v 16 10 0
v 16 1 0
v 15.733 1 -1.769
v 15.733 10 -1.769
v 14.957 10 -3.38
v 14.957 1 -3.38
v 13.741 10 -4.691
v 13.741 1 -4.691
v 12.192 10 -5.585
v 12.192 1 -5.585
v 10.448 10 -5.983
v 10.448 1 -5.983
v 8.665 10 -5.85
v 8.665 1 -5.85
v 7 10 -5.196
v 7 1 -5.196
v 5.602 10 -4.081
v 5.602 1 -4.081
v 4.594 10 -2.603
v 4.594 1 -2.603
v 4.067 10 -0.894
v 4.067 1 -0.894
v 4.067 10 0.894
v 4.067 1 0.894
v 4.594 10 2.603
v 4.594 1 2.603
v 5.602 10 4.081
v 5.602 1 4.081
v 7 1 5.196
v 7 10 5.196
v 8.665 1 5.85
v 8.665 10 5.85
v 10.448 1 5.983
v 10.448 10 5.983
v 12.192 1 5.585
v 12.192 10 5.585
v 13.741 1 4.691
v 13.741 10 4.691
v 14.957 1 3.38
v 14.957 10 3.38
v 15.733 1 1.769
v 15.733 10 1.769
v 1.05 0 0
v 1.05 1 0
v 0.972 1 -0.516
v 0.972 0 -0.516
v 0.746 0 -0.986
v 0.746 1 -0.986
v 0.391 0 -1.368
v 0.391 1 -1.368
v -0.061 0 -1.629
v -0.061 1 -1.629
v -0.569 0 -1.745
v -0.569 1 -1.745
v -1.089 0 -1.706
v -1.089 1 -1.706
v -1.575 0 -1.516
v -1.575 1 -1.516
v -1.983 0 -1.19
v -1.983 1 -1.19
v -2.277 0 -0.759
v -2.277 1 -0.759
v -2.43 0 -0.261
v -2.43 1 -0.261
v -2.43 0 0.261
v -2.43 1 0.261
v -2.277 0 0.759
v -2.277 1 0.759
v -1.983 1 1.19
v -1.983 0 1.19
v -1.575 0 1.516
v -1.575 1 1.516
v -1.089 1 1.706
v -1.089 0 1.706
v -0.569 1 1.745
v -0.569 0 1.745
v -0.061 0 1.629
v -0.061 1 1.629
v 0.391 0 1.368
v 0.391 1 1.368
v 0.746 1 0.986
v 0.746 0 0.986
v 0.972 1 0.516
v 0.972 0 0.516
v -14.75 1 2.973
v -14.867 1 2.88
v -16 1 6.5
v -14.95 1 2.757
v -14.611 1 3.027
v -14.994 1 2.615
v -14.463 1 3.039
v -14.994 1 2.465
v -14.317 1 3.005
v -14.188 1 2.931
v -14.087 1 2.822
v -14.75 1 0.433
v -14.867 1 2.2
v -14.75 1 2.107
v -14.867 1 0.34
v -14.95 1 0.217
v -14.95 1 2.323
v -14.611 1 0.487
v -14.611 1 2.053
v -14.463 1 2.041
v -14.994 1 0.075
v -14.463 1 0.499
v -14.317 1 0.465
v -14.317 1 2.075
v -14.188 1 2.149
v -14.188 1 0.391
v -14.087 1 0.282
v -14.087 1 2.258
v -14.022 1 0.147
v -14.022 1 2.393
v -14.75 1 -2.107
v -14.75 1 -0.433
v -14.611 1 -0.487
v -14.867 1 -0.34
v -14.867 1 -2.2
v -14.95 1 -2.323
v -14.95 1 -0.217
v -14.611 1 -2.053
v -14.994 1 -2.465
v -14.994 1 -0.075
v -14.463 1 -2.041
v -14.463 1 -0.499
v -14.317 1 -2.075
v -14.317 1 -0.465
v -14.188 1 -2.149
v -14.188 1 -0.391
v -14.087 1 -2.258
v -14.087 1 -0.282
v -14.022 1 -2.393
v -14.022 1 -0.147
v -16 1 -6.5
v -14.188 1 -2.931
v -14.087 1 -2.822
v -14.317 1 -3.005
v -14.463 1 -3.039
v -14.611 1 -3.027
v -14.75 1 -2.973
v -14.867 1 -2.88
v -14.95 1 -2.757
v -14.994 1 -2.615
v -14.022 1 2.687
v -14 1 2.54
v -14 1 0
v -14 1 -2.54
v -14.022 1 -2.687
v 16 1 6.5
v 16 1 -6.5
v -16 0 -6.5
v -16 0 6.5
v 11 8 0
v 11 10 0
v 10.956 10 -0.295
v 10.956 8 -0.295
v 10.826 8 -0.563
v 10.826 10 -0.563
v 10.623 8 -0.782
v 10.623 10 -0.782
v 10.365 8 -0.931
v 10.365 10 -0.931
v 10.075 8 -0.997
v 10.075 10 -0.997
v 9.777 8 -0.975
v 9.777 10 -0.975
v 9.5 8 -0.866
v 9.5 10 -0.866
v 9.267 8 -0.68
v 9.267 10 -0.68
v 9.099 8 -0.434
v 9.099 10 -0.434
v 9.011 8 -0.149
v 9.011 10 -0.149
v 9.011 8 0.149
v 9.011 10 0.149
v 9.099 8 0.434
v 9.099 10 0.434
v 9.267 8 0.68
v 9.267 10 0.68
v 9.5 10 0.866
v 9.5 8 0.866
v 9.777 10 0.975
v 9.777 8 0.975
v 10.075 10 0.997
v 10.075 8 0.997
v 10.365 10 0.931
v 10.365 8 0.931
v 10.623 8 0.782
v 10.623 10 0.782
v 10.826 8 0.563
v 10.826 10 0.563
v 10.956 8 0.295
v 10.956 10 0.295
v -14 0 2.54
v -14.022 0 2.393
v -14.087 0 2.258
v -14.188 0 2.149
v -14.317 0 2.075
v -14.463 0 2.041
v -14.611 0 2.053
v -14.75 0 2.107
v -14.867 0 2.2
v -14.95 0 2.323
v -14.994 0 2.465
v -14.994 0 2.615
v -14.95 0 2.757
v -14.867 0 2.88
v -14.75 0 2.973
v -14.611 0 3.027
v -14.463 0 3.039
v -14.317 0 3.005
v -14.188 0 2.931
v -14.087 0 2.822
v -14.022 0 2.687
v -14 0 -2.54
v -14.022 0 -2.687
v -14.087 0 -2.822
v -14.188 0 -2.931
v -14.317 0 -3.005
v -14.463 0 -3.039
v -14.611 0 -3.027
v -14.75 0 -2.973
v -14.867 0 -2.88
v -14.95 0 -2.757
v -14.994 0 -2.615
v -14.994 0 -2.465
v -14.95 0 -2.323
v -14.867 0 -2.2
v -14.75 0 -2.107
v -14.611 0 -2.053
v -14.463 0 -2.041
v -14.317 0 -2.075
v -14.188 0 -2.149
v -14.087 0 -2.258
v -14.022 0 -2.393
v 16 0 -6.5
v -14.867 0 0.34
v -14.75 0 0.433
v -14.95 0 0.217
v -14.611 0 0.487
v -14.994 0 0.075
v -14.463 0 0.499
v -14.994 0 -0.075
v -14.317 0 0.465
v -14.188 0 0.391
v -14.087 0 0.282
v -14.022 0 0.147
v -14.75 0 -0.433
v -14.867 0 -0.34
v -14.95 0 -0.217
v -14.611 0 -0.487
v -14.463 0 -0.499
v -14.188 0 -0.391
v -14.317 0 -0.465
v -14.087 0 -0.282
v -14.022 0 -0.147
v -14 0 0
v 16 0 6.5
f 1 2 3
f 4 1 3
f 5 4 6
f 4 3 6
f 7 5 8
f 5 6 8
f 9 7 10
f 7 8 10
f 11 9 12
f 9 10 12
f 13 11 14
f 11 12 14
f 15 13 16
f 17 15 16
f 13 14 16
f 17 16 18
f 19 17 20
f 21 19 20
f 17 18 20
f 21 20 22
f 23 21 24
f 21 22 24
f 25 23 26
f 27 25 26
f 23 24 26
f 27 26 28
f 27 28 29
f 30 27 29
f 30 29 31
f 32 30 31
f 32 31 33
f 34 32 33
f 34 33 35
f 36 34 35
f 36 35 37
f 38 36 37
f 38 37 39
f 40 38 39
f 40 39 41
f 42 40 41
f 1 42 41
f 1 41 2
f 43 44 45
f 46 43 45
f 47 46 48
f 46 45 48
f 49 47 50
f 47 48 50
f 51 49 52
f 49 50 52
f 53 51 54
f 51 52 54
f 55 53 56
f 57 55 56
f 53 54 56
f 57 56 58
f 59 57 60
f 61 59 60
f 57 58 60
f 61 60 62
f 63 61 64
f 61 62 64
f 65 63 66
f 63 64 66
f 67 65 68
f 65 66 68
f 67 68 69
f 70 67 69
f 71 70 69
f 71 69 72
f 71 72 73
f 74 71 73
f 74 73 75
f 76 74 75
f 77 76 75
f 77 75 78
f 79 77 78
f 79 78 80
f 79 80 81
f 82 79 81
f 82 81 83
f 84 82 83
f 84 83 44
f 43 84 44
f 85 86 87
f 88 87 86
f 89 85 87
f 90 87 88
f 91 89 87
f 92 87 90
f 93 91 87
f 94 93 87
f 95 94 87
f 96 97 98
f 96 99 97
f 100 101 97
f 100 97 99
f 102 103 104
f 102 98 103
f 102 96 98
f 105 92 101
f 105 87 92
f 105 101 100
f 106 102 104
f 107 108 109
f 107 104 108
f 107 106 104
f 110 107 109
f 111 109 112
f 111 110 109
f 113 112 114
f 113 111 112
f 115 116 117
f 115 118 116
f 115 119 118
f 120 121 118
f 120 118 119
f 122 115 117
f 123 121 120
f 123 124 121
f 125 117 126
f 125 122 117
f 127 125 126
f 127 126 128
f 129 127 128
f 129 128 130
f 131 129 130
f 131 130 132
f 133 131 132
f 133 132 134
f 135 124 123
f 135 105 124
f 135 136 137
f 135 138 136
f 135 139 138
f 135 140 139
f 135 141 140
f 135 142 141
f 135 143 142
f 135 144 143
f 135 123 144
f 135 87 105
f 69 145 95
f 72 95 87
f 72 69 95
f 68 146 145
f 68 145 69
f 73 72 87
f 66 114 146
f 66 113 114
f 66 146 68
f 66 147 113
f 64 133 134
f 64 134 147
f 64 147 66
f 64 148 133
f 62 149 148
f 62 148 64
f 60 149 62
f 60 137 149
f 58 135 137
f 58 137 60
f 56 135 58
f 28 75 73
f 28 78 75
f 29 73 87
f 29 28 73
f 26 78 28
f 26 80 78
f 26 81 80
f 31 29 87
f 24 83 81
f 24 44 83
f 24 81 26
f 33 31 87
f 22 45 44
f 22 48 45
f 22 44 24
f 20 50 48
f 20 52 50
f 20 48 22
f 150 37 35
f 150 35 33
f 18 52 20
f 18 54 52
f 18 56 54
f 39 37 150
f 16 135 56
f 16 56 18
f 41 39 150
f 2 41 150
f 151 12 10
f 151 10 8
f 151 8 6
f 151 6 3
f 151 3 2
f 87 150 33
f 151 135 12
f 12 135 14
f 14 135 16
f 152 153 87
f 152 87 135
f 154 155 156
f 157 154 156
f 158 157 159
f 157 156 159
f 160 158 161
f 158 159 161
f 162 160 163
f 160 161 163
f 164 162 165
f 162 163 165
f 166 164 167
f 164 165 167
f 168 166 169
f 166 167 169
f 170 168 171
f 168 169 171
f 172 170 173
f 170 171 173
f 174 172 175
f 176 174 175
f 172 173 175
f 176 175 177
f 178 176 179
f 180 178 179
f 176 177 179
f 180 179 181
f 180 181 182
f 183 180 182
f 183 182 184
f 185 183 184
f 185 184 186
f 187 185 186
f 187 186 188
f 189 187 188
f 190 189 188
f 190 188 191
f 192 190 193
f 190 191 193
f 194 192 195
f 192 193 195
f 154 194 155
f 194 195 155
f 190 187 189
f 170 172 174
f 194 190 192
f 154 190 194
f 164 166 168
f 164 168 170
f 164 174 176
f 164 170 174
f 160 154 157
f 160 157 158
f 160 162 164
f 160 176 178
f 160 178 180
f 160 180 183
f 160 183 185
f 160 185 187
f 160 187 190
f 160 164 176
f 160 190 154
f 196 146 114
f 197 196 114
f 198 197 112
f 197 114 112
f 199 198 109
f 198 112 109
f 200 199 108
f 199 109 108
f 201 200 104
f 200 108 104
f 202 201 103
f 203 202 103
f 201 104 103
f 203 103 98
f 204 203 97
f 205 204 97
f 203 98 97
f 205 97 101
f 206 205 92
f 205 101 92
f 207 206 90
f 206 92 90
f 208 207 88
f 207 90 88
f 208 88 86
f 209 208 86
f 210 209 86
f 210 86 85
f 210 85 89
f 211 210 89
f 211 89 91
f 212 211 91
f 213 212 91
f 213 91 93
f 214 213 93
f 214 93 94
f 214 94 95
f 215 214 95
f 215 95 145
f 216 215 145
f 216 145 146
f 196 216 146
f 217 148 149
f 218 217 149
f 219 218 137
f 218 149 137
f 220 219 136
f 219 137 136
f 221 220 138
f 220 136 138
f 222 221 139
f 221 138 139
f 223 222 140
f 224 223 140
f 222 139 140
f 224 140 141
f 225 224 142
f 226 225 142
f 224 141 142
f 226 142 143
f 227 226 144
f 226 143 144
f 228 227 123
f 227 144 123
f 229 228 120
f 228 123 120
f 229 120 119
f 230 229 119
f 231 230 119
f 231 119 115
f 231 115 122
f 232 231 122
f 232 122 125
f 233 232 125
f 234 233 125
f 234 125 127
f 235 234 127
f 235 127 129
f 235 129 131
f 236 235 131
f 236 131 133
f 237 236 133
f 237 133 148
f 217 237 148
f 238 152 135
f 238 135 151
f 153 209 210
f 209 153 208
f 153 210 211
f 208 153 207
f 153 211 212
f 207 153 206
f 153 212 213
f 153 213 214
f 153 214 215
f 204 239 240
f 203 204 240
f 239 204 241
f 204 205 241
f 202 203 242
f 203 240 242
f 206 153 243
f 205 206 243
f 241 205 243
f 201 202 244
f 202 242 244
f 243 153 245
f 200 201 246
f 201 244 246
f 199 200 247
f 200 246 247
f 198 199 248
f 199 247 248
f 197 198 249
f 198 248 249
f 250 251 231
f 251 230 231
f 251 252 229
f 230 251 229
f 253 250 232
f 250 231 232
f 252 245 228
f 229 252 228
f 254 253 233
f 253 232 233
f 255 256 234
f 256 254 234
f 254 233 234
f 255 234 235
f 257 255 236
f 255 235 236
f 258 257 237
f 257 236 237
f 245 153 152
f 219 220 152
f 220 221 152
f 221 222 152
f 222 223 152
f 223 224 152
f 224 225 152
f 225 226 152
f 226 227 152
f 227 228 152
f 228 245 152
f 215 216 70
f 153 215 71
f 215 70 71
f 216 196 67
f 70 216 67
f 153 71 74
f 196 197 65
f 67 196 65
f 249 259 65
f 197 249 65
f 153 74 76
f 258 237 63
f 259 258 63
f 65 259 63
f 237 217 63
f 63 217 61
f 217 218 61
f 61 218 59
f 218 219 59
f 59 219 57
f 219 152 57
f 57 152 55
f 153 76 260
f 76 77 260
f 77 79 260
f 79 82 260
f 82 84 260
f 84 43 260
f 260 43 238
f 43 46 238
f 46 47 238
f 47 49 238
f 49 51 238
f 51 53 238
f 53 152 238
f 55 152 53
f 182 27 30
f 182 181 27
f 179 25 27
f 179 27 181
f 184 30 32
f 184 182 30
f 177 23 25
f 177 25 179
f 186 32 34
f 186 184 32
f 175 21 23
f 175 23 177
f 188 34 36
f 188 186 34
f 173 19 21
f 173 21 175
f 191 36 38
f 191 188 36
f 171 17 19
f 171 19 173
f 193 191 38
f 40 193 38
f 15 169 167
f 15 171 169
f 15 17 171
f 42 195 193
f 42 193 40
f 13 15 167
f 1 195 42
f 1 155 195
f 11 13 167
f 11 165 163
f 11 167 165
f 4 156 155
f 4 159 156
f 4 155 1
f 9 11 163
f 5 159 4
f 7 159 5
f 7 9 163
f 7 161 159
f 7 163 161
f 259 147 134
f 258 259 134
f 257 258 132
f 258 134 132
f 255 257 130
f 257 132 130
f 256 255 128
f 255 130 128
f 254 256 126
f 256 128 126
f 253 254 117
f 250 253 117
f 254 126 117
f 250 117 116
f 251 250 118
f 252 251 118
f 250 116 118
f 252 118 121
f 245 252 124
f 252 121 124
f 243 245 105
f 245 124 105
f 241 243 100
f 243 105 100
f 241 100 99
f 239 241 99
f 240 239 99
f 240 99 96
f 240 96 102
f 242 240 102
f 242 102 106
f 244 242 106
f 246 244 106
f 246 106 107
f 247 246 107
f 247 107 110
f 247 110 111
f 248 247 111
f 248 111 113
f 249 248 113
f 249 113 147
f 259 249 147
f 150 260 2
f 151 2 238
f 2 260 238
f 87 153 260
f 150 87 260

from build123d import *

# Parameters (mm, degrees)
SKETCH_1_W          = 32
SKETCH_1_H          = 13
EXTRUDE_1_DEPTH     = 1
SKETCH_2_R          = 1.75
CUT_EXTRUDE_1_DEPTH = 2
EXTRUDE_START       = -1
SKETCH_4_R          = 6
EXTRUDE_2_DEPTH     = 10
SKETCH_5_R          = 0.5
CUT_EXTRUDE_2_DEPTH = 2
SKETCH_6_R          = 1
CUT_EXTRUDE_3_DEPTH = 2


with BuildPart() as part:
    # 草图1 → 凸台-拉伸1 (new body)
    with BuildSketch(Plane(origin=(0, 0, 0), x_dir=(1, 0, 0), z_dir=(0, 1, 0))):
        Rectangle(SKETCH_1_W, SKETCH_1_H)
    extrude(amount=EXTRUDE_1_DEPTH)

    # 草图2 → 切除-拉伸1 (cut, through all)
    with BuildSketch(Plane(origin=(0, 1, 0), x_dir=(1, 0, 0), z_dir=(0, 1, 0))):
        with Locations((-0.7, 0)):
            Circle(SKETCH_2_R)
    extrude(amount=-CUT_EXTRUDE_1_DEPTH, mode=Mode.SUBTRACT)

    # 草图4 → 凸台-拉伸2 (add)
    with BuildSketch(Plane(origin=(0, 1, 0), x_dir=(1, 0, 0), z_dir=(0, 1, 0)).offset(EXTRUDE_START)):
        with Locations((10, 0)):
            Circle(SKETCH_4_R)
    extrude(amount=EXTRUDE_2_DEPTH)

    # 草图5 → 切除-拉伸2 (cut, through all)
    with BuildSketch(Plane(origin=(0, 1, 0), x_dir=(1, 0, 0), z_dir=(0, 1, 0))):
        with Locations((-14.5, 2.54)):
            Circle(SKETCH_5_R)
        with Locations((-14.5, 0)):
            Circle(SKETCH_5_R)
        with Locations((-14.5, -2.54)):
            Circle(SKETCH_5_R)
    extrude(amount=-CUT_EXTRUDE_2_DEPTH, mode=Mode.SUBTRACT)

    # 草图6 → 切除-拉伸3 (cut)
    with BuildSketch(Plane(origin=(0, 10, 0), x_dir=(1, 0, 0), z_dir=(0, 1, 0))):
        with Locations((10, 0)):
            Circle(SKETCH_6_R)
    extrude(amount=-CUT_EXTRUDE_3_DEPTH, mode=Mode.SUBTRACT)


solid = part.part
